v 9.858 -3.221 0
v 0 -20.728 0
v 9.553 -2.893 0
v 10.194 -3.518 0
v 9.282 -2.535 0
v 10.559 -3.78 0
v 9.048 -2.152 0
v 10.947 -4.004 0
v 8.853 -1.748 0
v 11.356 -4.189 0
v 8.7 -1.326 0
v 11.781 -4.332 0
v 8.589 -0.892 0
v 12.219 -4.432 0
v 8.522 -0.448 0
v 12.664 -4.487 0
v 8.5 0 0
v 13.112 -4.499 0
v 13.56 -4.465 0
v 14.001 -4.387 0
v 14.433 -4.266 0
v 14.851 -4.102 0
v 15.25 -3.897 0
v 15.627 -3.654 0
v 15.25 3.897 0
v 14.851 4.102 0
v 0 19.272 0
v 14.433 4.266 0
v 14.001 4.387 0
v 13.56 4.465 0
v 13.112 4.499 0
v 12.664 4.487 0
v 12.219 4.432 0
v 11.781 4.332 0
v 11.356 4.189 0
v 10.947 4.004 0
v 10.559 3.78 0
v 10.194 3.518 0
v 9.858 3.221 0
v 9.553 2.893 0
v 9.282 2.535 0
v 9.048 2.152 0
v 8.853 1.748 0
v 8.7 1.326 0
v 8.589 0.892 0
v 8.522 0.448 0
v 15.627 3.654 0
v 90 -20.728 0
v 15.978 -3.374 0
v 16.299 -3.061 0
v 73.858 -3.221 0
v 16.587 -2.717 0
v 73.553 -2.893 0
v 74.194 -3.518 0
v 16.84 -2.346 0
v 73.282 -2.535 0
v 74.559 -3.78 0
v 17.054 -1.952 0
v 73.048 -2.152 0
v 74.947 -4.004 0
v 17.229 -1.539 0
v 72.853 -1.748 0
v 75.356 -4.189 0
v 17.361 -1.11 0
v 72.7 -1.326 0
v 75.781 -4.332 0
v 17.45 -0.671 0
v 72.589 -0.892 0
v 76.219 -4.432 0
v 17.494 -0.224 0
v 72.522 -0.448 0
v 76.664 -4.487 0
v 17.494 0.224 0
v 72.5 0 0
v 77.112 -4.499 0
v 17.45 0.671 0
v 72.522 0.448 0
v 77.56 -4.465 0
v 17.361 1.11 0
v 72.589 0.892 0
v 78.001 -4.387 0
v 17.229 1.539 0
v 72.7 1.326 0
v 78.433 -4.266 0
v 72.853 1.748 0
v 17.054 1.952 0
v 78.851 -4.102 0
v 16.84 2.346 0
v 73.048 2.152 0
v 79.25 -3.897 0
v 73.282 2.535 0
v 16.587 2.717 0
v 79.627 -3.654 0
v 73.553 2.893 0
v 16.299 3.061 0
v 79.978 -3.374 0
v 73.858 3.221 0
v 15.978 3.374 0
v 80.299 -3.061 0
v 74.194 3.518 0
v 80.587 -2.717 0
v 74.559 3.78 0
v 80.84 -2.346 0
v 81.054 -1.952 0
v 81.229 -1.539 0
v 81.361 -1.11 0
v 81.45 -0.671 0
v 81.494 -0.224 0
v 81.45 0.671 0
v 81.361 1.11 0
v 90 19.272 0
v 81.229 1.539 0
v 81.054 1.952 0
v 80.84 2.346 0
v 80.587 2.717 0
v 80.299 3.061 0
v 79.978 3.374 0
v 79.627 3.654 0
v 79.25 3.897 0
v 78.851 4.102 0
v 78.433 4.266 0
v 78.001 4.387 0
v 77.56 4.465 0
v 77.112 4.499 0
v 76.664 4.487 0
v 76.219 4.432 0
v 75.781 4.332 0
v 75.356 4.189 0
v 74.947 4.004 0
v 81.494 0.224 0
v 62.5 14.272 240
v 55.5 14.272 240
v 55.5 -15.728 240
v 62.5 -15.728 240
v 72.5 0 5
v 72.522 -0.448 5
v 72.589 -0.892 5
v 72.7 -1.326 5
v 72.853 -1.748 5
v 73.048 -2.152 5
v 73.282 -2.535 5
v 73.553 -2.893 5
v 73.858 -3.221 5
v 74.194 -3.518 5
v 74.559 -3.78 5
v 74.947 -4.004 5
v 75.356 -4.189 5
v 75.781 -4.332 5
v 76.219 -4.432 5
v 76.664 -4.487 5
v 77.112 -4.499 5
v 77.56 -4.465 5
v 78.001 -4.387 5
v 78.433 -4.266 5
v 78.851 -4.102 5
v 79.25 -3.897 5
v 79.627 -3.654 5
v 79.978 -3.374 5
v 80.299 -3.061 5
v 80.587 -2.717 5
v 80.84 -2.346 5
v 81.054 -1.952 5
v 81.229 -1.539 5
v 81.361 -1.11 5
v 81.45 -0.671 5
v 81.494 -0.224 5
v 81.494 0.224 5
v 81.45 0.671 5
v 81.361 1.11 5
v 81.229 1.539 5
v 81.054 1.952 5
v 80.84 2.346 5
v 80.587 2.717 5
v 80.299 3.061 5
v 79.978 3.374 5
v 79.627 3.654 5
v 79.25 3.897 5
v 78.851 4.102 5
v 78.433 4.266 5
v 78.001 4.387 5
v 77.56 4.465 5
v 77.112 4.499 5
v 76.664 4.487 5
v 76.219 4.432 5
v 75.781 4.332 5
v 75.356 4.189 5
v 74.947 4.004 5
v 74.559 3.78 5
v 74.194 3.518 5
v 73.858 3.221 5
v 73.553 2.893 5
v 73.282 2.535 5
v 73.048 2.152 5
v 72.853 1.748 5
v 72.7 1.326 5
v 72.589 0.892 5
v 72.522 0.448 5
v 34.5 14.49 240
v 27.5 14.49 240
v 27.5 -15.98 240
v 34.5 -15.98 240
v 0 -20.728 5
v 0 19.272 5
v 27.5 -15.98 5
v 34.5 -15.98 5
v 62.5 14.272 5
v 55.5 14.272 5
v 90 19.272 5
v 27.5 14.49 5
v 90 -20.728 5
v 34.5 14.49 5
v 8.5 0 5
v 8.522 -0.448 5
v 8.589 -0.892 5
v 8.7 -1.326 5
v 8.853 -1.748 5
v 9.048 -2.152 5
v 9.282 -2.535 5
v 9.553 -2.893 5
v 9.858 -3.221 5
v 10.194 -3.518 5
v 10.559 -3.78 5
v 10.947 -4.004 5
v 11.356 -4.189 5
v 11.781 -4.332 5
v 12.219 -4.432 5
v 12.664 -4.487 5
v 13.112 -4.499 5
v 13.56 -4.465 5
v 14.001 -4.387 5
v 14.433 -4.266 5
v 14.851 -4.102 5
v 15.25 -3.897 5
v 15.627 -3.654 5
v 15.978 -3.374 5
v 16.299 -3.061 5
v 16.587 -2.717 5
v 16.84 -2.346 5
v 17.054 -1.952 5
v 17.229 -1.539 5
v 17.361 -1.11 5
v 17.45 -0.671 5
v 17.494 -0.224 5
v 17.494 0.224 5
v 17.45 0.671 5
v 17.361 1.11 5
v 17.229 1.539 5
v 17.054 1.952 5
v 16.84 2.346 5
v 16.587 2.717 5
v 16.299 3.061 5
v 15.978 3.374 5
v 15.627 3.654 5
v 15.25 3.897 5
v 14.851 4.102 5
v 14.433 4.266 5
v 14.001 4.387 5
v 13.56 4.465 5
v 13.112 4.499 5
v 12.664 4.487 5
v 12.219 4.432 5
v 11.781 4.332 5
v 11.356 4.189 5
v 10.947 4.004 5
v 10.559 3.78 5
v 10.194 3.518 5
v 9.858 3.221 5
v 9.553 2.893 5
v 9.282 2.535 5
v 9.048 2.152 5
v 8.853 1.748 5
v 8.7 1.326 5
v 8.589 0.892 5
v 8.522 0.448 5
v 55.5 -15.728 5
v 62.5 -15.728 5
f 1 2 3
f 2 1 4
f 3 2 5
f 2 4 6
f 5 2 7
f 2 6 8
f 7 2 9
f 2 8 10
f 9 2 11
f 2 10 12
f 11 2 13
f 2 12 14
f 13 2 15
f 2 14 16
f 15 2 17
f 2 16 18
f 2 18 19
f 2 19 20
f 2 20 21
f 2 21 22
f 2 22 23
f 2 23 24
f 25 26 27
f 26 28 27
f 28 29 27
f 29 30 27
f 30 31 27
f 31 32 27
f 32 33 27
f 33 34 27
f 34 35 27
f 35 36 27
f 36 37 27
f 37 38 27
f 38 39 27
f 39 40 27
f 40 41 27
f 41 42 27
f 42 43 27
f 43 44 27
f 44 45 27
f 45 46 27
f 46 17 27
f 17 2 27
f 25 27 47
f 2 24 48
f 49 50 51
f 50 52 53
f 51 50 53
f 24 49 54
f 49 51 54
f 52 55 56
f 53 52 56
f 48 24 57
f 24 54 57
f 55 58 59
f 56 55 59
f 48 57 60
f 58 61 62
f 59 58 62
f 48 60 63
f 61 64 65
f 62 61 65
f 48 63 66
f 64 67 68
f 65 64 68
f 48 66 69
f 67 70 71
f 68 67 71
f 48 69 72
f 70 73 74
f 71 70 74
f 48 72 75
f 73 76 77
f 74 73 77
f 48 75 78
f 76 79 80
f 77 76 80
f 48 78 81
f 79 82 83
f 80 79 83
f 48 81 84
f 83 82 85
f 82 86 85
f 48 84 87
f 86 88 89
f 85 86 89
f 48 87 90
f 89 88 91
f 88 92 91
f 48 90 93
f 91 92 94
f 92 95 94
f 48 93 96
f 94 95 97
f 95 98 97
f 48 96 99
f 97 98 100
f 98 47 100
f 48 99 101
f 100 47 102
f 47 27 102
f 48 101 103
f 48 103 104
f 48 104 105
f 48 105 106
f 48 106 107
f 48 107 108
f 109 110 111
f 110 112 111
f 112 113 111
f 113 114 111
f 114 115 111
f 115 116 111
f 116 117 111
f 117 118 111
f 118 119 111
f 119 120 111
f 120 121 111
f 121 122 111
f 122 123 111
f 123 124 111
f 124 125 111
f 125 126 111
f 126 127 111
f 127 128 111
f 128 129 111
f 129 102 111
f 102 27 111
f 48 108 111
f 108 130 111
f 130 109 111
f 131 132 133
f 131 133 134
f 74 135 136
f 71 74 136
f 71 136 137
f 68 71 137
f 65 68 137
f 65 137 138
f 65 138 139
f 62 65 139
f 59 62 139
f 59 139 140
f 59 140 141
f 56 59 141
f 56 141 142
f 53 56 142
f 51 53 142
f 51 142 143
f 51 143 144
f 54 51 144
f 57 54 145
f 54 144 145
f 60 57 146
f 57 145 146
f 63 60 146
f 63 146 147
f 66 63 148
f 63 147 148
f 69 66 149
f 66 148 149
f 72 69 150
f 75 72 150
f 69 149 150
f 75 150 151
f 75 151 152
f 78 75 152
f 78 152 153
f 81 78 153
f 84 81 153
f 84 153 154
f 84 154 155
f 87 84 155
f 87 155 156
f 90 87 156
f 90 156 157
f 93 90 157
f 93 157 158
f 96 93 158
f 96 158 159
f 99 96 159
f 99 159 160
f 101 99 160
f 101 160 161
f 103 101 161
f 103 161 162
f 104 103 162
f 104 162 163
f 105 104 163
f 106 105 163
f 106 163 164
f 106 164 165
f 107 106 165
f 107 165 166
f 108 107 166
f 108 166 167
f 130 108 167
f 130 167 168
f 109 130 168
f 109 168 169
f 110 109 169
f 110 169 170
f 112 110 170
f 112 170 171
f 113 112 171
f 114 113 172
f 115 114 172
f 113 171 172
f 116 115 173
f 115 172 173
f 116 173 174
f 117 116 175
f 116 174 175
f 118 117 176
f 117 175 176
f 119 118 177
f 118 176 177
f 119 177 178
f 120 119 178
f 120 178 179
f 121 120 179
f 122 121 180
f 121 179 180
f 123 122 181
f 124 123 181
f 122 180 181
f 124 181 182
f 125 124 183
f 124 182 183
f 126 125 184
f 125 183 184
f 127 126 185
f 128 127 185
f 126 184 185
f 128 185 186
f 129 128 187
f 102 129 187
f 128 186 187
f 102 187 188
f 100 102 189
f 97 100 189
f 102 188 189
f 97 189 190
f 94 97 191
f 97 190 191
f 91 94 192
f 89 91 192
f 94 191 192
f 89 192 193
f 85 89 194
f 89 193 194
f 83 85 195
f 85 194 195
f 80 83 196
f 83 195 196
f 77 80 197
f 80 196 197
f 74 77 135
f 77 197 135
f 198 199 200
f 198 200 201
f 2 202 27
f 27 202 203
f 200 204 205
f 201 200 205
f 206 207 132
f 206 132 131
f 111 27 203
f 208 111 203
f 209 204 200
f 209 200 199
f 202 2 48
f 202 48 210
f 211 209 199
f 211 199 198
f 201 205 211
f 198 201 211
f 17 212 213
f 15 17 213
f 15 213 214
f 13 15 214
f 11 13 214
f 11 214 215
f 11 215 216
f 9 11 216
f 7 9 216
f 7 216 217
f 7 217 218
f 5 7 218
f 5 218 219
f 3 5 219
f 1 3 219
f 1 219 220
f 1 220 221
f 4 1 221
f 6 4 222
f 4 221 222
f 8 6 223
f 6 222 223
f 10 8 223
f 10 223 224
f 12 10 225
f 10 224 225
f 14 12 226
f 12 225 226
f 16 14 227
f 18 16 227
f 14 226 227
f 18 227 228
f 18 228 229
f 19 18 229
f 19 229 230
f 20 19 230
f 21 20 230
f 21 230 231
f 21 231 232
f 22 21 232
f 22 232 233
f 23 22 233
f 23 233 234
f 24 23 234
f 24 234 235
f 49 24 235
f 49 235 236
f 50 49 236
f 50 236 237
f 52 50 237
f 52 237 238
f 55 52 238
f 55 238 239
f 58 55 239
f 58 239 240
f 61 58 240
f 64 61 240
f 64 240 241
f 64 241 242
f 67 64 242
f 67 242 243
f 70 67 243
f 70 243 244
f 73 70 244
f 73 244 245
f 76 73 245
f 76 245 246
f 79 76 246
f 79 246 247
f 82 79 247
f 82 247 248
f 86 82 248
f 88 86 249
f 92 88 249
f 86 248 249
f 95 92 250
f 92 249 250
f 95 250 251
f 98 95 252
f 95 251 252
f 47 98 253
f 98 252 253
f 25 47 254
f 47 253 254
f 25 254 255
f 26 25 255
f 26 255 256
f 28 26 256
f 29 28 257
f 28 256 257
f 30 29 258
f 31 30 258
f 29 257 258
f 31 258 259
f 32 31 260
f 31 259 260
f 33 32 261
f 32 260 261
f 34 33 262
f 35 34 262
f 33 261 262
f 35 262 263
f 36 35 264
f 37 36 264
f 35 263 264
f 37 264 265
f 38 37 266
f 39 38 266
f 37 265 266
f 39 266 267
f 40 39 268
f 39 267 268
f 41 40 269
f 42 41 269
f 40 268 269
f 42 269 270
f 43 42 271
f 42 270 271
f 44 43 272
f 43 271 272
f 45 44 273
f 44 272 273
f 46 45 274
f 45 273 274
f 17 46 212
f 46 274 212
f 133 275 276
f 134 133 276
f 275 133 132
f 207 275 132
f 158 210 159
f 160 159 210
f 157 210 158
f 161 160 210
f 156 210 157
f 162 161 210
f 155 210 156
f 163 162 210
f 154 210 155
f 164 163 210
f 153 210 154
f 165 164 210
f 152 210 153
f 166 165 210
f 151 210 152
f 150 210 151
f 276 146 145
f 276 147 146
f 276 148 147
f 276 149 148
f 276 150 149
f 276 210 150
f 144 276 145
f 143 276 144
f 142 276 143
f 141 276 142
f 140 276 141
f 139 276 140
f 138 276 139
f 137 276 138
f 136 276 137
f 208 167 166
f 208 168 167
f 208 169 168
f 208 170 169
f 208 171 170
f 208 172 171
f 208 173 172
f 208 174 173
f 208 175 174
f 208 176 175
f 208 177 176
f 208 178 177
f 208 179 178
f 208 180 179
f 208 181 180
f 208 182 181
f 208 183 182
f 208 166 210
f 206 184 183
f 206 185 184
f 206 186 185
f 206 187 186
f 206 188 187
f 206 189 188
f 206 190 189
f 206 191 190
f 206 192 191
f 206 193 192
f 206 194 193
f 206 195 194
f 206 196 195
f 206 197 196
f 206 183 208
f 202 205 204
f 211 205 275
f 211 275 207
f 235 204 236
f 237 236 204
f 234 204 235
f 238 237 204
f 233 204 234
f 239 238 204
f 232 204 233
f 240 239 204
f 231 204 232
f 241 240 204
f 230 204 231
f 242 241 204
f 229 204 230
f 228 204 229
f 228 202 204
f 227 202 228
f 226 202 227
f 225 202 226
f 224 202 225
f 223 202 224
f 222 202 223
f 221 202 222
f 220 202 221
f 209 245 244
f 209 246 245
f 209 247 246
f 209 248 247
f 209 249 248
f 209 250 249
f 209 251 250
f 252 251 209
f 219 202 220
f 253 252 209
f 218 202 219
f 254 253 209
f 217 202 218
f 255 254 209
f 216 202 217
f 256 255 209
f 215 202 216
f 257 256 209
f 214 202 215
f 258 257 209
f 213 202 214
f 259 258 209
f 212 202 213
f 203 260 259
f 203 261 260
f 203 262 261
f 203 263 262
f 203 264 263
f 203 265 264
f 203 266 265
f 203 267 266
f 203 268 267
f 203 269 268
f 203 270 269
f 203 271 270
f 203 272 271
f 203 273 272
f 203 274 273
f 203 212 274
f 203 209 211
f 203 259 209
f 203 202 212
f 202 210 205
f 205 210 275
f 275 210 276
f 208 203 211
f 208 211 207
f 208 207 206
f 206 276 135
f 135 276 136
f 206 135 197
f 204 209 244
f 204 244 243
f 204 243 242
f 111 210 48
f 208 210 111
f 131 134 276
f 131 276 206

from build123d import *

# Parameters (mm, degrees)
F0_W     = 40
F0_H     = 5
F1_DEPTH = 90
F2_W     = 7
F2_H     = 30.4702166427
F2_H_2   = 30
F3_DEPTH = 240
F5_D     = 9


# Not quite as in the source:
# - a feature names something its author has since deleted; it is built from what else it names


with BuildPart() as f1:
    # F0 (on Right) → F1 (new body)
    with BuildSketch(Plane.YZ):
        with Locations((-0.72813743, 2.5)):
            Rectangle(F0_W, F0_H)
    extrude(amount=F1_DEPTH)

    # F2 (on Top) → F3 (join)
    with BuildSketch(Plane.XY):
        with Locations((31, -0.7447636027)):
            Rectangle(F2_W, F2_H)
        with Locations((59, -0.72813743)):
            Rectangle(F2_W, F2_H_2)
    extrude(amount=F3_DEPTH)

    # F5 (through all)
    with Locations(Plane(origin=(0, 0, 0), x_dir=(1, 0, 0), z_dir=(0, 0, -1))):
        with Locations((13, 0), (77, 0)):
            Hole(F5_D / 2)


solid = f1.part
